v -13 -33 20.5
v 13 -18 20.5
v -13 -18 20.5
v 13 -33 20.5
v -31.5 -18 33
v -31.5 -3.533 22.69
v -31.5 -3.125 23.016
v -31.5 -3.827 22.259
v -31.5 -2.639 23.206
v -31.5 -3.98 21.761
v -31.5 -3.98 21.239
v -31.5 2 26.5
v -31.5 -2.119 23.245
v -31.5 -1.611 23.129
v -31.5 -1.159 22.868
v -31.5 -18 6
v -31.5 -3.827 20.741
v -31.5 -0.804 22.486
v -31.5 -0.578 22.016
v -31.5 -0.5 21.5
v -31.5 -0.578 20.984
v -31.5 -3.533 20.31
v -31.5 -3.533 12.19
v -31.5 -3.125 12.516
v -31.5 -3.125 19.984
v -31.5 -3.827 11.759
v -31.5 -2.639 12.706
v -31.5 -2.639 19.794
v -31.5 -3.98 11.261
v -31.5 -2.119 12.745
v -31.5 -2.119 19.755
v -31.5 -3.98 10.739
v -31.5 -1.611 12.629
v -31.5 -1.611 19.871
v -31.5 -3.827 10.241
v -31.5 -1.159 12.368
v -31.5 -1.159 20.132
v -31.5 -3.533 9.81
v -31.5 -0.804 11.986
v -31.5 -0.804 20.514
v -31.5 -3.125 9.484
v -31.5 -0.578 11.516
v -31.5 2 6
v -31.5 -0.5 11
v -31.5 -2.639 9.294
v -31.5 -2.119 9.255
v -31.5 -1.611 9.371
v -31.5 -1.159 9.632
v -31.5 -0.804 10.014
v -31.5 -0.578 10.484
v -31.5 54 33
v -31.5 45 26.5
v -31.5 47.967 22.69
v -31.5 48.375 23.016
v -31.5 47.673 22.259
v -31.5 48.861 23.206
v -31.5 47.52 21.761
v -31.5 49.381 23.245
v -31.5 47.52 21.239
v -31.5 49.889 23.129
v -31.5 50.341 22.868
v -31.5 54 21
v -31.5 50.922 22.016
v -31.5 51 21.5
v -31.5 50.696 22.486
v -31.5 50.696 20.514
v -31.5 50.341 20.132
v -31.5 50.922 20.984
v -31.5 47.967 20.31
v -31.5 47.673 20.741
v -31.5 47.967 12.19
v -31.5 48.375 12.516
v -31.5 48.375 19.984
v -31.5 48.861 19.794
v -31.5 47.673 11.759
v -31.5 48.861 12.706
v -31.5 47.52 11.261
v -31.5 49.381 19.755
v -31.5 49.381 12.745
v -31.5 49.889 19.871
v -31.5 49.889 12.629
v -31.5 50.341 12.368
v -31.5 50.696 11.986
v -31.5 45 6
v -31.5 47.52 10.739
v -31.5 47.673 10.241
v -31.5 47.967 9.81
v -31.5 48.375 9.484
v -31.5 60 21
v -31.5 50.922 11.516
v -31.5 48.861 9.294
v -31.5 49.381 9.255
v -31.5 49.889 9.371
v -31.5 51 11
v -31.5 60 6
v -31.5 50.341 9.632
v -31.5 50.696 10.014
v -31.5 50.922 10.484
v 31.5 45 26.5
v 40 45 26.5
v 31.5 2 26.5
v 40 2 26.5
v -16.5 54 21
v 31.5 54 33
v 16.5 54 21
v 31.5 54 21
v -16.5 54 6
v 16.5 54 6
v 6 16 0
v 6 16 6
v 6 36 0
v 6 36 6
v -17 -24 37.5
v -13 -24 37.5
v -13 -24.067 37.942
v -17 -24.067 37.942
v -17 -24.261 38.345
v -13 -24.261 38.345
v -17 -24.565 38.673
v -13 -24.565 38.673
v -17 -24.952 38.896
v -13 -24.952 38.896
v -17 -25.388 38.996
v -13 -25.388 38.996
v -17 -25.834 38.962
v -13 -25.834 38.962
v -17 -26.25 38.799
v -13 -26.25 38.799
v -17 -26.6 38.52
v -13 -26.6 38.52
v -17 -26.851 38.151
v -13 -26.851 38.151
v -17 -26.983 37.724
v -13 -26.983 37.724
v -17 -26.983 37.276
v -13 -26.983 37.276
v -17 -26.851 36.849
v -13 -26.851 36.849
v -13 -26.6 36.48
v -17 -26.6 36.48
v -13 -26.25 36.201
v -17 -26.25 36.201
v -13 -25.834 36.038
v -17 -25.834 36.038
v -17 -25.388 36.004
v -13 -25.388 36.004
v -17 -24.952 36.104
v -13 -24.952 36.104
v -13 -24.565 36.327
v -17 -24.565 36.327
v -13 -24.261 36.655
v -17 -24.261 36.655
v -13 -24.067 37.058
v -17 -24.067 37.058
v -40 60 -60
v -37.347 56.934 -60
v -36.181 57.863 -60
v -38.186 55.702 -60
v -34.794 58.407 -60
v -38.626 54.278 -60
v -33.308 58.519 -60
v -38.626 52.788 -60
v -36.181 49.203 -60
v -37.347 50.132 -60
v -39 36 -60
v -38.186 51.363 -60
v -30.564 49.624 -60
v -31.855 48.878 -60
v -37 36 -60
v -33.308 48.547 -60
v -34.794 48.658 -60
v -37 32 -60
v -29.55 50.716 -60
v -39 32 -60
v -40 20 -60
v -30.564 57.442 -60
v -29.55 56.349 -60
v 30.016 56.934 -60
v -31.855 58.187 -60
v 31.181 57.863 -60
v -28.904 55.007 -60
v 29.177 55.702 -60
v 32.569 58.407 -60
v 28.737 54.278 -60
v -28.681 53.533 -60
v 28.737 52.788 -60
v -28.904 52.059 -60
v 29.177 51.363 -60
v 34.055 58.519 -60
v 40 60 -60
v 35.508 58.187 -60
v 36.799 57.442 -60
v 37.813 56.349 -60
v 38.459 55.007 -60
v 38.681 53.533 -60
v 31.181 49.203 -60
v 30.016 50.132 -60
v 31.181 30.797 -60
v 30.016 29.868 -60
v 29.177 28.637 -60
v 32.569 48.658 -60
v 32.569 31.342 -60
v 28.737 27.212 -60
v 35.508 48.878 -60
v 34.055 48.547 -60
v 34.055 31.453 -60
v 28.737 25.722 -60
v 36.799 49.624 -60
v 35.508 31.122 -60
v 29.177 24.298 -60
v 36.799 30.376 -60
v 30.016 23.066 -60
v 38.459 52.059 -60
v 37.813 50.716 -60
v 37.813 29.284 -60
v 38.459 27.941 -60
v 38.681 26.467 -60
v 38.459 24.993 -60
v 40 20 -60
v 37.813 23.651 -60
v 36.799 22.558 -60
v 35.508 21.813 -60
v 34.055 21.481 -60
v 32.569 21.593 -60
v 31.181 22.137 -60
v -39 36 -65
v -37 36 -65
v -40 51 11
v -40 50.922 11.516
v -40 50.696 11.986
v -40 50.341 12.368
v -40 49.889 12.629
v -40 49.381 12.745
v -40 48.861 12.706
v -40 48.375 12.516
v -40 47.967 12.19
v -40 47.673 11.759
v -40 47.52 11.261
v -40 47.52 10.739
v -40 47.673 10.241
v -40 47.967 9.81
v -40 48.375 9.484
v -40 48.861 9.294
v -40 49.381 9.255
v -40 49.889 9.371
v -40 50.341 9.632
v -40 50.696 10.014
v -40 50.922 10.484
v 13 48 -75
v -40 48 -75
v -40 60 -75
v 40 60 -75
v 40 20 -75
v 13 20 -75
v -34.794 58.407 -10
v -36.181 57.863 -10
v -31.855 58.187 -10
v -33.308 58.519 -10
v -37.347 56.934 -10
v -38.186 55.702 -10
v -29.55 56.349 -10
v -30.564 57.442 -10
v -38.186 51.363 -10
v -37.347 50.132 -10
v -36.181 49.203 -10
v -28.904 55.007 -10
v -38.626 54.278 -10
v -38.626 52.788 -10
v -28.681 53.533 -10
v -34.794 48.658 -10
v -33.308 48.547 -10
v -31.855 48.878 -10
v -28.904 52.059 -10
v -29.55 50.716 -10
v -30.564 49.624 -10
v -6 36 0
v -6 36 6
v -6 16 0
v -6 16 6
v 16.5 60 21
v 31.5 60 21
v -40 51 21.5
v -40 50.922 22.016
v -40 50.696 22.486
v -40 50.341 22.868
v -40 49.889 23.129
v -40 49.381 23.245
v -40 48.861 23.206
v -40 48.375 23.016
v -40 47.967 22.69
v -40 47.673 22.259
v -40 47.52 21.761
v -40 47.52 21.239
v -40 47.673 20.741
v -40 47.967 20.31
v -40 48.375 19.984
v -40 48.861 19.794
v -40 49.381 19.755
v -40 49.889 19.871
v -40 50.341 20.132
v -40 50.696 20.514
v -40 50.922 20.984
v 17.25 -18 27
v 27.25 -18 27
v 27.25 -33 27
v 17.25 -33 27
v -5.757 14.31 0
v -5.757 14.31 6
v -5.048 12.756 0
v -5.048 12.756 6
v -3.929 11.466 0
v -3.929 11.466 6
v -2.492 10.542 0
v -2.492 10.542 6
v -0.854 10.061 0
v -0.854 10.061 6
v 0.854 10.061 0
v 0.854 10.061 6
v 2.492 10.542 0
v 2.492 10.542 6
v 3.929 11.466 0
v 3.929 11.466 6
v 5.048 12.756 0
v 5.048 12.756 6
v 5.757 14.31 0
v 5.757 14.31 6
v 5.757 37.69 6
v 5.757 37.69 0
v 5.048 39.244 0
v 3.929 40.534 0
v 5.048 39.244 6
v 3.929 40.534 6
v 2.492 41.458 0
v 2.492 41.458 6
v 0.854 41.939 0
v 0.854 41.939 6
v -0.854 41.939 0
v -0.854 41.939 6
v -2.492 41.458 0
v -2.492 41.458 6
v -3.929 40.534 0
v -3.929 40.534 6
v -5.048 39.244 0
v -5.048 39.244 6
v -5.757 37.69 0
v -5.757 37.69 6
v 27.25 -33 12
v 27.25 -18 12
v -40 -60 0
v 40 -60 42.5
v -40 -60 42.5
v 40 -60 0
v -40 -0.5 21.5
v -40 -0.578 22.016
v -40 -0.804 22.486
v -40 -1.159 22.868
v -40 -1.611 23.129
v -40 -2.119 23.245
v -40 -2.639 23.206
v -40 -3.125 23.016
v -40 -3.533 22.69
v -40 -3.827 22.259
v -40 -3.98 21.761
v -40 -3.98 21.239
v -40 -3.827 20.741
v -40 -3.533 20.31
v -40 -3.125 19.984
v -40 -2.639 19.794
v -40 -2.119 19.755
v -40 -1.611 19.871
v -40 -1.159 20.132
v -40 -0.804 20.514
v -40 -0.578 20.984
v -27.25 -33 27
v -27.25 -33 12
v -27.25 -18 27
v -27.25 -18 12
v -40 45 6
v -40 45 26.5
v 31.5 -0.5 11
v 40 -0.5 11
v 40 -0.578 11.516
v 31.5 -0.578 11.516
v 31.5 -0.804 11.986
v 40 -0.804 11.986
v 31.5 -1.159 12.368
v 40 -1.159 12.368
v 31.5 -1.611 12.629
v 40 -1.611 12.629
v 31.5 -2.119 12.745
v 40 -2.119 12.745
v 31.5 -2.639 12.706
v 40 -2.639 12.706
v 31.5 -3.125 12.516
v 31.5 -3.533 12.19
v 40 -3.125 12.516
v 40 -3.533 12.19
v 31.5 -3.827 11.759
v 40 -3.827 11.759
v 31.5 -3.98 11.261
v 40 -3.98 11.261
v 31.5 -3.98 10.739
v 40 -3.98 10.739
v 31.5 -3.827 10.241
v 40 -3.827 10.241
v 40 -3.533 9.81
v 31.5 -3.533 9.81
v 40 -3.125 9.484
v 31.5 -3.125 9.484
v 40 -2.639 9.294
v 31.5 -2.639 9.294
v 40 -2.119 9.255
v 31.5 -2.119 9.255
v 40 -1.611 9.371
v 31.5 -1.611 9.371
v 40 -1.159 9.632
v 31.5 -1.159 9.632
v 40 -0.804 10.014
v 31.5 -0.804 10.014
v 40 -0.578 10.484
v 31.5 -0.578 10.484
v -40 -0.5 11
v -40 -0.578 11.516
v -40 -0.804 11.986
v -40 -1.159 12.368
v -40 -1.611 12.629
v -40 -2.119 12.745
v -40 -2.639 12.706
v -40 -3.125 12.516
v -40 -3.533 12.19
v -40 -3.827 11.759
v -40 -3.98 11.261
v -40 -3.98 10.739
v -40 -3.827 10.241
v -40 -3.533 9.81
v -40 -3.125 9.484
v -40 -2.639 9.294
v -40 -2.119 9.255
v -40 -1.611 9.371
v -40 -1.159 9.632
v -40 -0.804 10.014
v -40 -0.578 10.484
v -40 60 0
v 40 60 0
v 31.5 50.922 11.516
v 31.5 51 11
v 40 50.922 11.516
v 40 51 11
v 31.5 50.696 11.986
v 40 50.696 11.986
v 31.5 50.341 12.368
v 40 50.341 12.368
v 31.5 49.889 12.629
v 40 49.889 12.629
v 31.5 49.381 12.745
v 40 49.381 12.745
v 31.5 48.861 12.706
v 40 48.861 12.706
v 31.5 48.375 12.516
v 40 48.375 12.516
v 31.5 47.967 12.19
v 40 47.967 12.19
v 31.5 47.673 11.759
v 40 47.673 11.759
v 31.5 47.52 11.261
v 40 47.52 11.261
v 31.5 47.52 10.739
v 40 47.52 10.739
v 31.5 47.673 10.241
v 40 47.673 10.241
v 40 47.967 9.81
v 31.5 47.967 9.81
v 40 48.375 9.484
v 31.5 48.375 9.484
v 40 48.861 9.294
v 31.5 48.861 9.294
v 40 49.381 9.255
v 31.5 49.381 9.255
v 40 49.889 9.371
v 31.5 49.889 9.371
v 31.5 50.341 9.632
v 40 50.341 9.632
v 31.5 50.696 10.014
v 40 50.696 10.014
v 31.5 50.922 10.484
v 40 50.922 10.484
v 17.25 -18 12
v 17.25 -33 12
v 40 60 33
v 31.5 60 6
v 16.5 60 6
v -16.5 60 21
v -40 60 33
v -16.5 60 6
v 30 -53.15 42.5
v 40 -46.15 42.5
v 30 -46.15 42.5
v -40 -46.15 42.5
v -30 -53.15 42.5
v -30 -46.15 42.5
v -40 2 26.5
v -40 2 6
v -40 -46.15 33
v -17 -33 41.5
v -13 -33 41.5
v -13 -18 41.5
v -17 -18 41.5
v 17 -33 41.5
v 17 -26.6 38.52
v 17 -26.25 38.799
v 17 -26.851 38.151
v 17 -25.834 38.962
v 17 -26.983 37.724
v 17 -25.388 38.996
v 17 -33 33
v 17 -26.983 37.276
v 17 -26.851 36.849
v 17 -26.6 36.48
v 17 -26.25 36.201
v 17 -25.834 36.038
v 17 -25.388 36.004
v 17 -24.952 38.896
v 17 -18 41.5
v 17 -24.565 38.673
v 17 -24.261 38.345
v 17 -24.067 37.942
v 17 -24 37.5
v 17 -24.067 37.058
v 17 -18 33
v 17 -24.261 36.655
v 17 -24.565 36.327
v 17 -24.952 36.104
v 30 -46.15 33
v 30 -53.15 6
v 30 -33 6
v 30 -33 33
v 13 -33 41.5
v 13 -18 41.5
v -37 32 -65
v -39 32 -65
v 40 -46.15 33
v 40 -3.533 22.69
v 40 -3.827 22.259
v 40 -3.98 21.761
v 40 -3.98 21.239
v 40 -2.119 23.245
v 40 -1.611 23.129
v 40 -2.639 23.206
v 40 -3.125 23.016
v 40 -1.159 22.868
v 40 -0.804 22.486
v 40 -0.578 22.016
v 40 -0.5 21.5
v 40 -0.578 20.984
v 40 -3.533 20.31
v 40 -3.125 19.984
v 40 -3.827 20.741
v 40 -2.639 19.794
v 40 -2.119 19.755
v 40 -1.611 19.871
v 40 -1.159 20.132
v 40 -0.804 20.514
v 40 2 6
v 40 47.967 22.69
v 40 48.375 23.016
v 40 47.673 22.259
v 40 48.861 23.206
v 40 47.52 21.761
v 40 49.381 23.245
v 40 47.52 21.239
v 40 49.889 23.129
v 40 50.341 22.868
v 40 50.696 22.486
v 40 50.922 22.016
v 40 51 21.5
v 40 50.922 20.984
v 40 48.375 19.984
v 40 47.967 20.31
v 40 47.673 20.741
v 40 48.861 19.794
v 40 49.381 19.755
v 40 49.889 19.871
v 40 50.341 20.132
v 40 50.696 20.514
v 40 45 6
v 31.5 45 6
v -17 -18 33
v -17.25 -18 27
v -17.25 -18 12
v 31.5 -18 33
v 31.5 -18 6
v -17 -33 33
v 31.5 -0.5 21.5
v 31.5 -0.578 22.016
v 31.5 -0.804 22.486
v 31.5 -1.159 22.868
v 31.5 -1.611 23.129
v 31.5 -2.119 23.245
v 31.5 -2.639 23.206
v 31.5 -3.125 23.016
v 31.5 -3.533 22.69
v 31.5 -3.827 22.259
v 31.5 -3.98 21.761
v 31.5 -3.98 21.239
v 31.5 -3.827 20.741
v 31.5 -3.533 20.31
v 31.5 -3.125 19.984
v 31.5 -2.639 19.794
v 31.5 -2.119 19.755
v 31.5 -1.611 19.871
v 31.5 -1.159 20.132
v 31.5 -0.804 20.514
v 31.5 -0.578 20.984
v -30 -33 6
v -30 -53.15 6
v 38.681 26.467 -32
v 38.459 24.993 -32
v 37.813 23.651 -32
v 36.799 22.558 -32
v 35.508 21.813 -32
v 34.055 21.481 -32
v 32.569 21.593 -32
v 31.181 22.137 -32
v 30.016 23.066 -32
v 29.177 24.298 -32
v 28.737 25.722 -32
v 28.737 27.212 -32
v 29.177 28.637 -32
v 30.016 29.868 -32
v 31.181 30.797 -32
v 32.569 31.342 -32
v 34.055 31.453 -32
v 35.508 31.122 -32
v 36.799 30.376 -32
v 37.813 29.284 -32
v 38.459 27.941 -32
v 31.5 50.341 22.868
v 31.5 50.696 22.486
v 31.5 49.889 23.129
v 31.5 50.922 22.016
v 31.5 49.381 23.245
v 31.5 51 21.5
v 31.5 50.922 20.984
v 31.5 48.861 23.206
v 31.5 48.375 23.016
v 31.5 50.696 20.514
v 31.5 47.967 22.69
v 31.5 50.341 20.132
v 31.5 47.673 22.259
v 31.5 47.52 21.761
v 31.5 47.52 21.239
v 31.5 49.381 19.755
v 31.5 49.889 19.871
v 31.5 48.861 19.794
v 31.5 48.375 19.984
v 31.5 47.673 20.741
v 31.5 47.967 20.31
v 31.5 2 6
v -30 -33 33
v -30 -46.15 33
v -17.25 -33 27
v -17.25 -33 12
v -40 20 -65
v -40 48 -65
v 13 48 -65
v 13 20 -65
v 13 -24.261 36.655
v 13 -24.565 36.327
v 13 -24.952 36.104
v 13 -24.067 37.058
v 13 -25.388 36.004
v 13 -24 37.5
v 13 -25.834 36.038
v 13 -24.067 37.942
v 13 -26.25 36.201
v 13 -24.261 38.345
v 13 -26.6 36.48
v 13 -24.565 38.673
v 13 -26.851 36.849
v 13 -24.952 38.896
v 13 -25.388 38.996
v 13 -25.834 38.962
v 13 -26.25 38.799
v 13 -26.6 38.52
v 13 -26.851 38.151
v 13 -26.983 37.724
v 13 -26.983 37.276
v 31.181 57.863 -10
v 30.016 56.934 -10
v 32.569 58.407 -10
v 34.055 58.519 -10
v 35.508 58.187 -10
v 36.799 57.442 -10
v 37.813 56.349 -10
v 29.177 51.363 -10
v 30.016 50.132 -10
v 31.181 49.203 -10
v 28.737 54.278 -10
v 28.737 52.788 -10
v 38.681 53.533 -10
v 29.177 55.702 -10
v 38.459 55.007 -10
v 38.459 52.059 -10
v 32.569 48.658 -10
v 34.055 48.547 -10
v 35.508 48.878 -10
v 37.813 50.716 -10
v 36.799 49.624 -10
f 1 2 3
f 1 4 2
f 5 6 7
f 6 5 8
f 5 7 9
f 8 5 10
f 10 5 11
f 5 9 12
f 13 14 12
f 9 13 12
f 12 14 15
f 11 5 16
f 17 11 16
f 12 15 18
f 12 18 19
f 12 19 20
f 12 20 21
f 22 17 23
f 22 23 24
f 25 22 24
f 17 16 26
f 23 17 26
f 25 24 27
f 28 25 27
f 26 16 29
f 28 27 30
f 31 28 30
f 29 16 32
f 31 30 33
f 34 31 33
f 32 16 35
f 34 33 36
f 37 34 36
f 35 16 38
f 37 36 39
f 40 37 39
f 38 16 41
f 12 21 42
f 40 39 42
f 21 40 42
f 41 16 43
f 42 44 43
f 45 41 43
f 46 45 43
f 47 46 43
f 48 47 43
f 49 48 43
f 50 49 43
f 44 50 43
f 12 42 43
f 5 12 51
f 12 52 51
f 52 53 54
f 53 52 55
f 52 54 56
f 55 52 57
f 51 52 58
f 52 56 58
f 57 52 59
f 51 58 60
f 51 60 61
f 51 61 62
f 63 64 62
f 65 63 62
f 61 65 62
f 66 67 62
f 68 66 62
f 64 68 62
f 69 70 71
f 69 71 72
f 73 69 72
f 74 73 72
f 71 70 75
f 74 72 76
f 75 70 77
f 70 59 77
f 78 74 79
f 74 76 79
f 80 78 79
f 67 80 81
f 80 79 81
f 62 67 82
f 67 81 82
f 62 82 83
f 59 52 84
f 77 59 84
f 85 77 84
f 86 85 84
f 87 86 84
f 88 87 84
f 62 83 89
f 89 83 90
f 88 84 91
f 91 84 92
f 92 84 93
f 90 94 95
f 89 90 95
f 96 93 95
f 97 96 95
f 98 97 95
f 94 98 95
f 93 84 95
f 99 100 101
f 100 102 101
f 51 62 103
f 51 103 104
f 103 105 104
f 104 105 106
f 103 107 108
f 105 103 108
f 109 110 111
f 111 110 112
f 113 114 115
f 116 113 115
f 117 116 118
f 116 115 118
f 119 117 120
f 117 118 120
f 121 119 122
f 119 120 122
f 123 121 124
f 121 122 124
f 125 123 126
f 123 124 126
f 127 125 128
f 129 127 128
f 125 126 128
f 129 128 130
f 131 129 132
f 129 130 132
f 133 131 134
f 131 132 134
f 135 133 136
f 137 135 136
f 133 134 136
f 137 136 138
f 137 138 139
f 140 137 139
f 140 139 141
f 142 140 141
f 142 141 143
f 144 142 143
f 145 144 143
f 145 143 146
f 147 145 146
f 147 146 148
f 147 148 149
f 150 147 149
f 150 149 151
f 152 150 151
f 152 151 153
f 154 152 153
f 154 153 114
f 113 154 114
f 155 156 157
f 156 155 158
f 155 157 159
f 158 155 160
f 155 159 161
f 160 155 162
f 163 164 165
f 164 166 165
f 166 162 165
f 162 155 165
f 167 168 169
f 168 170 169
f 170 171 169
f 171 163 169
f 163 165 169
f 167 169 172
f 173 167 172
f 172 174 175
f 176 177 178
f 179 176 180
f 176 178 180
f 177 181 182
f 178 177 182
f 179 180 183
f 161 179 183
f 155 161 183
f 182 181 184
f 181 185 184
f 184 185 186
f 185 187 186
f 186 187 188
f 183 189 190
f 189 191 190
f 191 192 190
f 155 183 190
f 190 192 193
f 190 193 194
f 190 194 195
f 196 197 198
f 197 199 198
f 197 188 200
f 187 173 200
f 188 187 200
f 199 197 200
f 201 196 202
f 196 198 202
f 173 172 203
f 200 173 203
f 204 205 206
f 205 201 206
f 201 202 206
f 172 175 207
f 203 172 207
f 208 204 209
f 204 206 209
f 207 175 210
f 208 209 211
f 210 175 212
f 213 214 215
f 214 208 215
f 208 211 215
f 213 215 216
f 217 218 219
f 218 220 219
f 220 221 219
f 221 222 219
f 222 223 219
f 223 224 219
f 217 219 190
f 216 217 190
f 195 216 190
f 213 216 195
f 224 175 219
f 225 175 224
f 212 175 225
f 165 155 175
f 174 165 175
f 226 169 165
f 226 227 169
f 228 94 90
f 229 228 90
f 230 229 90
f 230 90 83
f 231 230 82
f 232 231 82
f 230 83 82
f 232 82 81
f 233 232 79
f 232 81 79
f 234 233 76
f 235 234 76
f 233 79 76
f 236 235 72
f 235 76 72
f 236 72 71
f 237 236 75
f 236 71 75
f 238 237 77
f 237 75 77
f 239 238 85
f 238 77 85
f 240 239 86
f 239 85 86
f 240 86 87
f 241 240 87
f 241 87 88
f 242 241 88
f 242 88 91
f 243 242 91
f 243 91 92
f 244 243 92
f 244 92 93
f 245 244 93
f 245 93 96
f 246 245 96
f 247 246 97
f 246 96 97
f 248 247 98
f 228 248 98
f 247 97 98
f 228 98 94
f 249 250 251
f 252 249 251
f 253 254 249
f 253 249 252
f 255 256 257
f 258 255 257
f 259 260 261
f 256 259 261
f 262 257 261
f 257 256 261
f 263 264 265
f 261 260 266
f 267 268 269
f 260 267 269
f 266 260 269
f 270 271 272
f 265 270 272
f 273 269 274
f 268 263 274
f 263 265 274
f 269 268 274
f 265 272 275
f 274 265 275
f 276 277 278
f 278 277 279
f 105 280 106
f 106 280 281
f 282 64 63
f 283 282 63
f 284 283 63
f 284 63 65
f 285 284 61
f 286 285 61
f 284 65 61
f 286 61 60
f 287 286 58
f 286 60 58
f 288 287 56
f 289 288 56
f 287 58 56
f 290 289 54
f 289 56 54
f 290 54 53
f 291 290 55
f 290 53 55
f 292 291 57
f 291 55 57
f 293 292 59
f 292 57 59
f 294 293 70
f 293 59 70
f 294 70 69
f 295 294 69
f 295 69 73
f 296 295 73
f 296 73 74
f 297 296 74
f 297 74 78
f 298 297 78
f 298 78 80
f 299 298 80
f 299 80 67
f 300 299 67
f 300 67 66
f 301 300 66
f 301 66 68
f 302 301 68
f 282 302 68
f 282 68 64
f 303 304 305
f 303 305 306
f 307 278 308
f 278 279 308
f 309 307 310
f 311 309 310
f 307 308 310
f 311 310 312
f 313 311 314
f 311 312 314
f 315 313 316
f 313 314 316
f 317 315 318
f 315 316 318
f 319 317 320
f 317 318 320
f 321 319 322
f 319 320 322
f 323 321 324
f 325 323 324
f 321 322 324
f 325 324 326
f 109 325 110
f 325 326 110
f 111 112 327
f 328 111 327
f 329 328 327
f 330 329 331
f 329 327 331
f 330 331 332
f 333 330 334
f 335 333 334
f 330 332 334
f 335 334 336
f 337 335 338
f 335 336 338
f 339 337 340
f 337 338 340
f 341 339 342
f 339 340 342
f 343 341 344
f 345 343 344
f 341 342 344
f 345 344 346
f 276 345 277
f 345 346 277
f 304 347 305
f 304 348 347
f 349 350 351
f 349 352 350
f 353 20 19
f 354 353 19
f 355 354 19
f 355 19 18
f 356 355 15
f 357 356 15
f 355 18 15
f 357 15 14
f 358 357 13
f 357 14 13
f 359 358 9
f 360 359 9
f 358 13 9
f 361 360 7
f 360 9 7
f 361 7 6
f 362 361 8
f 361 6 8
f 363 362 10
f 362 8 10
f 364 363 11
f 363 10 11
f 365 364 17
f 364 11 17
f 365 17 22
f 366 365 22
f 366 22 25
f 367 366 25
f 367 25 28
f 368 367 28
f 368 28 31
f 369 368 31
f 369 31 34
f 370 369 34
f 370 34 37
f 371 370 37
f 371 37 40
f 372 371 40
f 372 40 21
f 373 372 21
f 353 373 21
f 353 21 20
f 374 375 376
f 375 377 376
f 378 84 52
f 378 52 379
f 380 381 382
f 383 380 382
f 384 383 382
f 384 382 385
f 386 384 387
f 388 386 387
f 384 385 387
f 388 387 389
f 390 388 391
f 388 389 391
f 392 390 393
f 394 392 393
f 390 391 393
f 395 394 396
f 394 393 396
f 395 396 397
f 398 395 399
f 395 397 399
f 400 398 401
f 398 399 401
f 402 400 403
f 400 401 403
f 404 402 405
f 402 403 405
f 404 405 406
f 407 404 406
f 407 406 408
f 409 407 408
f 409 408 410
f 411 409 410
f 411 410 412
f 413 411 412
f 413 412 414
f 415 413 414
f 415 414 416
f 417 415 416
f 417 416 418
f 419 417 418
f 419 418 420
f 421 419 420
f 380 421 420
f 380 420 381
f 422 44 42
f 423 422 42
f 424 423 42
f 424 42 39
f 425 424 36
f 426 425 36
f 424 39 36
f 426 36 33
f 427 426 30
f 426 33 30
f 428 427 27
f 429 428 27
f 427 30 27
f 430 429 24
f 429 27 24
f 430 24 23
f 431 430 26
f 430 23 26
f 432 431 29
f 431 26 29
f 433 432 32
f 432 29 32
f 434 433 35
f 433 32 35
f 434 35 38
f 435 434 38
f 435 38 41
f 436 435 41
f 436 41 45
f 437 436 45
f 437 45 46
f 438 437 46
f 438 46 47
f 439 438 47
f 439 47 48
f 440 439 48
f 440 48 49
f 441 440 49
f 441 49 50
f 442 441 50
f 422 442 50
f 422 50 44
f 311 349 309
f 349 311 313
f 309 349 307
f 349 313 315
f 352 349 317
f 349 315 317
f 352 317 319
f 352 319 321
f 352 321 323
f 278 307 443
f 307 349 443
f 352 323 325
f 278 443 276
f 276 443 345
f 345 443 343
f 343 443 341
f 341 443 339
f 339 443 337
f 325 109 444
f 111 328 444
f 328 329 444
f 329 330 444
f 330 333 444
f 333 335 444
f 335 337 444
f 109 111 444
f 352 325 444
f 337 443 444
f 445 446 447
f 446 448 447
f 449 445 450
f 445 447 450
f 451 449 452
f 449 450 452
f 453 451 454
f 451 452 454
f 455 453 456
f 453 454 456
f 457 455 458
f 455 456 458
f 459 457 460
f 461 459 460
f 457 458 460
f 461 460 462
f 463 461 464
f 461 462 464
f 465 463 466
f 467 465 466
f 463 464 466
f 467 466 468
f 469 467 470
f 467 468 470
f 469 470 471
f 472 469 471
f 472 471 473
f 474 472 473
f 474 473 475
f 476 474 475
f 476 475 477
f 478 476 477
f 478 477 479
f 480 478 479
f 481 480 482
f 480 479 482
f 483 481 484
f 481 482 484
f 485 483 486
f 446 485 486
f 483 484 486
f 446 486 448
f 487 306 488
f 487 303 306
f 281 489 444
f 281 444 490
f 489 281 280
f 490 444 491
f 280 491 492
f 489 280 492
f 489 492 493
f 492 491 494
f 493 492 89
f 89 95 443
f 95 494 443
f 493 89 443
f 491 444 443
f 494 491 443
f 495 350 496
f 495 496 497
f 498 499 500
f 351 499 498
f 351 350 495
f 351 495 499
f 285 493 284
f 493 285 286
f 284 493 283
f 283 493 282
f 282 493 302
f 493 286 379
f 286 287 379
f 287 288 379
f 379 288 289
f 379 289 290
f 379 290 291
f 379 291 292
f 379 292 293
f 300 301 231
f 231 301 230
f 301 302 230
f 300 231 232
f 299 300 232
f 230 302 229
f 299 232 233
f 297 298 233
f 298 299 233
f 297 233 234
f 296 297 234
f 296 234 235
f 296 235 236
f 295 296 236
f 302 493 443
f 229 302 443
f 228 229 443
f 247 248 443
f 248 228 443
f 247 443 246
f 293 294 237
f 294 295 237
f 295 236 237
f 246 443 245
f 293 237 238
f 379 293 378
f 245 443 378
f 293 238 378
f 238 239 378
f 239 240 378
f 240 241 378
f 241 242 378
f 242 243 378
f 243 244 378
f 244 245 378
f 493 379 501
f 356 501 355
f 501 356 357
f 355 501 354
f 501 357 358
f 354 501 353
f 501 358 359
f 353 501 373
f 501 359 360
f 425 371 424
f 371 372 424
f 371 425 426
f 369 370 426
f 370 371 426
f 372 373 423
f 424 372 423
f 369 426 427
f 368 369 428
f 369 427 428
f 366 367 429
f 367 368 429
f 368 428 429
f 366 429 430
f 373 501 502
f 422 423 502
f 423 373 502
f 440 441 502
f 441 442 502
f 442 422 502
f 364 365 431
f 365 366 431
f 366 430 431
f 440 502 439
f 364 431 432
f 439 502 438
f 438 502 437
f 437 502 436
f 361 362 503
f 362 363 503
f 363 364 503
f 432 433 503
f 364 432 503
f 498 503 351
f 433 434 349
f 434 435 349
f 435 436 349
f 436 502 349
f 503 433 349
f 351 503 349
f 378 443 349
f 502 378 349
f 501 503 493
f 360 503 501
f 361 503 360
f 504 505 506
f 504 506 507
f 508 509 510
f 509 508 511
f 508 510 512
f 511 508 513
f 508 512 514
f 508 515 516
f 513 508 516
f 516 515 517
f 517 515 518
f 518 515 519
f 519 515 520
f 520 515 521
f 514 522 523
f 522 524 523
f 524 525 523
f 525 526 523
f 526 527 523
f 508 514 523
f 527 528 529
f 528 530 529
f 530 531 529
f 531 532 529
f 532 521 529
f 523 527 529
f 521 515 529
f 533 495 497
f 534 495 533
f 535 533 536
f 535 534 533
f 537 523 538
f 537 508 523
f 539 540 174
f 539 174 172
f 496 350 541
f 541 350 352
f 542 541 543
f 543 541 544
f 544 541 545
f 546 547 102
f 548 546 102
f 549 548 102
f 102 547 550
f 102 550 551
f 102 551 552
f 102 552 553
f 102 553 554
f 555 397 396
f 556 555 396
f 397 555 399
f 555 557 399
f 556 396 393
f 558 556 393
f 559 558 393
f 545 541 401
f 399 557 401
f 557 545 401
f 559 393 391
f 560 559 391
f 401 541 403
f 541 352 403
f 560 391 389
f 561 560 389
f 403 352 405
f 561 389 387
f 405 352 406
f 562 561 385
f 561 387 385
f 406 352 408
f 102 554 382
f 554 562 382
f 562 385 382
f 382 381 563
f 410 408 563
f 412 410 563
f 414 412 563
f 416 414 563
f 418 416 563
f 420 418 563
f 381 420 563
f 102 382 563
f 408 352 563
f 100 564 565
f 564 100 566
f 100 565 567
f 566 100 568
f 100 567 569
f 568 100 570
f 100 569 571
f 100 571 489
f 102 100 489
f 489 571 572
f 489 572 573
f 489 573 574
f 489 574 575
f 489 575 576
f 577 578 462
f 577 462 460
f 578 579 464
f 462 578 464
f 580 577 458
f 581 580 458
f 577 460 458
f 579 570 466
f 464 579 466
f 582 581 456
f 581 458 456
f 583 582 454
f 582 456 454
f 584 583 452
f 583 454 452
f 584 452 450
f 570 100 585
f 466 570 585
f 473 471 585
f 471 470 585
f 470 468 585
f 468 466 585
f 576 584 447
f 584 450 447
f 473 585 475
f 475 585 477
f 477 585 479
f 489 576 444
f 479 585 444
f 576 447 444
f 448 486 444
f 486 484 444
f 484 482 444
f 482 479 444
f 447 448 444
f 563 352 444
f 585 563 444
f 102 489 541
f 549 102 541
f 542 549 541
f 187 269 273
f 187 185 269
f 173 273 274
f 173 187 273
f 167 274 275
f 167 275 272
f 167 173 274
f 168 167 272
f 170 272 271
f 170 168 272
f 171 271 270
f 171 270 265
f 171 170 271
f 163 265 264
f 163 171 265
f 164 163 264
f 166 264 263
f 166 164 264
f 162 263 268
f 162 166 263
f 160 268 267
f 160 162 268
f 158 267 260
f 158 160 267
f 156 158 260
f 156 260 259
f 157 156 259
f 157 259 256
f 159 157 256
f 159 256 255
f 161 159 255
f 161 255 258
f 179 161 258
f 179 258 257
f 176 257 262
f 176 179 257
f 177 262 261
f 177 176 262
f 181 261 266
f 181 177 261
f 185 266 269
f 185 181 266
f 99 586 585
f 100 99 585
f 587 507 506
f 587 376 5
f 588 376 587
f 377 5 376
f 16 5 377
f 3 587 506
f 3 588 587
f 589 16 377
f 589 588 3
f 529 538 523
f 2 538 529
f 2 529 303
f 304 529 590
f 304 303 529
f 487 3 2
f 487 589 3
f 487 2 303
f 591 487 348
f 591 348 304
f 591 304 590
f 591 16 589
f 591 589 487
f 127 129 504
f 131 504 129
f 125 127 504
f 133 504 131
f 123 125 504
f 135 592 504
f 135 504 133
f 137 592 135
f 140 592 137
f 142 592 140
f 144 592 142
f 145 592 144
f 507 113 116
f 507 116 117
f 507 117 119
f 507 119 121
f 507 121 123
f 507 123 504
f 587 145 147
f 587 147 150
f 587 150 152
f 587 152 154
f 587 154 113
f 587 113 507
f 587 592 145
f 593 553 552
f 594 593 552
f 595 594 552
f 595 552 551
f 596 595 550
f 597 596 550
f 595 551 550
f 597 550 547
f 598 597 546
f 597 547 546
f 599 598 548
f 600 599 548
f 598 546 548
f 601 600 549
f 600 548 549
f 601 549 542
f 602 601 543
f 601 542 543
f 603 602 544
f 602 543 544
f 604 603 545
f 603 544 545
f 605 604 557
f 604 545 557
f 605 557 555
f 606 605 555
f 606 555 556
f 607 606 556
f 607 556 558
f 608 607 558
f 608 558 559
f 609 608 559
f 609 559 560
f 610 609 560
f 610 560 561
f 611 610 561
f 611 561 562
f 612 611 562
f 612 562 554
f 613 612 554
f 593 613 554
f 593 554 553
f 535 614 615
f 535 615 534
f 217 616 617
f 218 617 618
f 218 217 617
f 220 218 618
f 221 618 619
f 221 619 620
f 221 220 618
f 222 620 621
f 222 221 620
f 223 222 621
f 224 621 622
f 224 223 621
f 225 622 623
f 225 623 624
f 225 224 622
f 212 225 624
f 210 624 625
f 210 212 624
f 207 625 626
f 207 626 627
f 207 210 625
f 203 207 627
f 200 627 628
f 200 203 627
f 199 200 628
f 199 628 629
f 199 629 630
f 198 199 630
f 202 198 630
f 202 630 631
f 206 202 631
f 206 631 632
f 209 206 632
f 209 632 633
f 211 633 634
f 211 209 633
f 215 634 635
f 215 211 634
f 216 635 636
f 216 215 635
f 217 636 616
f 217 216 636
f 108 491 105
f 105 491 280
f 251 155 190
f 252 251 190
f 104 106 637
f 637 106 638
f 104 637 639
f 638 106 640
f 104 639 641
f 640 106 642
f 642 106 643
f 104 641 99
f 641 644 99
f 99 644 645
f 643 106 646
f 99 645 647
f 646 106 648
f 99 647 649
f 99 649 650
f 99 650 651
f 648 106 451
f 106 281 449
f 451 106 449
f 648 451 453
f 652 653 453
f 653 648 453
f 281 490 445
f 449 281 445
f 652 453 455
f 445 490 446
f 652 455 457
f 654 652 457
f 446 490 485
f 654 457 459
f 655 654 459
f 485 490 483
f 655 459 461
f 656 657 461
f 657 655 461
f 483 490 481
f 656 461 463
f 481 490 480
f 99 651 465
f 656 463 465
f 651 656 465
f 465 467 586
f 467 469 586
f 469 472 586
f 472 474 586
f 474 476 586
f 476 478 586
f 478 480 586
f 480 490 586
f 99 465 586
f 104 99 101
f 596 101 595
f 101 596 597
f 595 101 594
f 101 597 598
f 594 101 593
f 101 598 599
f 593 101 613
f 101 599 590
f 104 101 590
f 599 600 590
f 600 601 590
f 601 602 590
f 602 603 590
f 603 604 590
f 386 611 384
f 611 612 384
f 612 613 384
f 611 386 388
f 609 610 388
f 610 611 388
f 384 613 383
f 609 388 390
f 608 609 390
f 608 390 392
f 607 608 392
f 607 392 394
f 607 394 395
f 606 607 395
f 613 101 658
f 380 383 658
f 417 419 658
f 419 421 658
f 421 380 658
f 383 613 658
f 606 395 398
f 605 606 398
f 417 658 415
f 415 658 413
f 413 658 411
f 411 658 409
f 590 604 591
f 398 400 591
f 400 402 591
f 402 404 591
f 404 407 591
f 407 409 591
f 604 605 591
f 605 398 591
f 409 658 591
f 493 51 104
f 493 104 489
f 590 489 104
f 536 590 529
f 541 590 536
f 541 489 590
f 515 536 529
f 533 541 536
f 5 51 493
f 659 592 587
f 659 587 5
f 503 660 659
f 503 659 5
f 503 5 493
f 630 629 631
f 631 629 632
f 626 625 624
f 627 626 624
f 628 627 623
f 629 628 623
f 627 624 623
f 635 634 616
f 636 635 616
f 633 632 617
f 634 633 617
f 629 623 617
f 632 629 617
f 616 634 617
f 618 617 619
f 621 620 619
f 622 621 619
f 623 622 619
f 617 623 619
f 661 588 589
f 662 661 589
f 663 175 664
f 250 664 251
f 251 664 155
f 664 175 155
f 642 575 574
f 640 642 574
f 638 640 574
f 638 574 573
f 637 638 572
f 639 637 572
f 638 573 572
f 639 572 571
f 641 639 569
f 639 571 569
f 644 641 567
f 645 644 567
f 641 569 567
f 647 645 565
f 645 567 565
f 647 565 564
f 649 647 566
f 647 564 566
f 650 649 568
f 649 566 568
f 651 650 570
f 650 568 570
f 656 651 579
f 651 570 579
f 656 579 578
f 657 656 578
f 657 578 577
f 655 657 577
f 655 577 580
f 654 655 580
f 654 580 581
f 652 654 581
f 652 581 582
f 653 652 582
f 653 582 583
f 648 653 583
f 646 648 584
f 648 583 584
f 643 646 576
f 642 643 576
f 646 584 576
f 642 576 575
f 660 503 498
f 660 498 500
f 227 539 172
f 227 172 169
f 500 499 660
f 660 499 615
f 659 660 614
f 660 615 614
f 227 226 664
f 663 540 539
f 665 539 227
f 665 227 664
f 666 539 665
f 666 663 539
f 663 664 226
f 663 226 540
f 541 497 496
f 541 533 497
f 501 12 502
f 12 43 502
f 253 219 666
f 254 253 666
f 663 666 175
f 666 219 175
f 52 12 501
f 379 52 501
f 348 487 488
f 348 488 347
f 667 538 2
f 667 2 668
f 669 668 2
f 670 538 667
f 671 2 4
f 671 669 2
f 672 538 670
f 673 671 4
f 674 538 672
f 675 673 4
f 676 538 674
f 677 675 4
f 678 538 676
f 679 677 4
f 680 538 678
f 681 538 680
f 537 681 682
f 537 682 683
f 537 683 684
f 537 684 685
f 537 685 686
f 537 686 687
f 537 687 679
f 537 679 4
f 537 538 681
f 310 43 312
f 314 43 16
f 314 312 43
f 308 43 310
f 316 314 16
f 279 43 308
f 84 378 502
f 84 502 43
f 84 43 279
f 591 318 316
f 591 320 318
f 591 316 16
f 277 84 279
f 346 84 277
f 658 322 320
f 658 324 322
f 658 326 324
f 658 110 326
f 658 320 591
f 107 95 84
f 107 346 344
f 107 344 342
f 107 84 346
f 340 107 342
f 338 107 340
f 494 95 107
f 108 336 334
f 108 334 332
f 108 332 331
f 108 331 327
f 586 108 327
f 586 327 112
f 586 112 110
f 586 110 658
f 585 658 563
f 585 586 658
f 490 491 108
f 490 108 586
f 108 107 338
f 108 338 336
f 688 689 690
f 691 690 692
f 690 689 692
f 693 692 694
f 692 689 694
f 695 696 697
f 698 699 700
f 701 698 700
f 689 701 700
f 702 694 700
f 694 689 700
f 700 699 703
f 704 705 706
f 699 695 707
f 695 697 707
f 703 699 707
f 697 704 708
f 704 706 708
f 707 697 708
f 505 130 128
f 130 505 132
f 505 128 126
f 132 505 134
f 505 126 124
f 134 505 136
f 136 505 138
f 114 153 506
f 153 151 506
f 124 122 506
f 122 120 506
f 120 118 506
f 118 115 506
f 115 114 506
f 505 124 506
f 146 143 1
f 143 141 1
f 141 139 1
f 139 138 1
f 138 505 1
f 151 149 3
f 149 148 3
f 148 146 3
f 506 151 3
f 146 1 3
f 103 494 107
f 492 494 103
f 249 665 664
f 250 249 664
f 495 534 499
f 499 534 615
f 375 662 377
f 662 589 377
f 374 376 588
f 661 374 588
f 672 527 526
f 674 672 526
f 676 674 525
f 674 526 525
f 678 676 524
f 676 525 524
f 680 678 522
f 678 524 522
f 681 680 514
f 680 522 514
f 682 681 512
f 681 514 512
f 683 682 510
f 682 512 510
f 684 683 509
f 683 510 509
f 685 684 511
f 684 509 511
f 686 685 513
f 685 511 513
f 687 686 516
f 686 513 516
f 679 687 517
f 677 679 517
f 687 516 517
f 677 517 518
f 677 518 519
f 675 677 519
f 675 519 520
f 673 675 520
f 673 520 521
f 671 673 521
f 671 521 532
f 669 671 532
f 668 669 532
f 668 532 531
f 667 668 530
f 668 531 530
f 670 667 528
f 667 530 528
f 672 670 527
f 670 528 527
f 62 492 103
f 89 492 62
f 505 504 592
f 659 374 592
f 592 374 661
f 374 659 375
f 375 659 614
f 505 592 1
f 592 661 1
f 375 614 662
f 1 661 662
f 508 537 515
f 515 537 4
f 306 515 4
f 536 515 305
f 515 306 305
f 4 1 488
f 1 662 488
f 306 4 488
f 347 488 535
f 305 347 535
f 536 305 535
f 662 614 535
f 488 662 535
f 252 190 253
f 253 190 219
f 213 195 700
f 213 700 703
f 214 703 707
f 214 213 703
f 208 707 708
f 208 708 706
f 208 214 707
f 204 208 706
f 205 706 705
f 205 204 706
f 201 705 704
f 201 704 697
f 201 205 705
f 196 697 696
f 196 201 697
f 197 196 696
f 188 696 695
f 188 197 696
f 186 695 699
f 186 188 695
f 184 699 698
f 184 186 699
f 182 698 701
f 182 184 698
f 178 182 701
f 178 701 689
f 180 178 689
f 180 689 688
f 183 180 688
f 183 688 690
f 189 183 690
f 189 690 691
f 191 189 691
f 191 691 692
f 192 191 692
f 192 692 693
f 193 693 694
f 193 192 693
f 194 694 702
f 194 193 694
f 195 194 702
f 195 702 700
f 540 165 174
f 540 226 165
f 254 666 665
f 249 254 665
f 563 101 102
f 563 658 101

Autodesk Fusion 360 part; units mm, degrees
sketch "Sketch1" plane through (0, 0, 0) normal (0, 0, 1) x (1, 0, 0)
  line L0 (40, -60) -> (-40, -60)
  line L1 (-40, -60) -> (-40, 60)
  line L2 (-40, 60) -> (40, 60)
  line L3 (40, 60) -> (40, -60)
  line L4 (40, -60) -> (-40, 60) construction
  line L5 (-40, -60) -> (40, 60) construction
  dimension "d1" = 80
  dimension "d2" = 120
extrude "Extrude1" add sketch "Sketch1" along normal blind 6 makes body 1
sketch "Sketch2" plane through (0, 0, 6) normal (0, 0, 1) x (-1, 0, 0)
  line L0 (-40, -60) -> (40, -60)
  line L1 (40, -60) -> (40, 60)
  line L2 (40, 60) -> (-40, 60)
  line L3 (-40, 60) -> (-40, -60)
  line L4 (40, 60) -> (-40, 60)
  line L5 (-40, 60) -> (-40, 53.15)
  line L6 (-40, 53.15) -> (40, 53.15)
  line L7 (40, 53.15) -> (40, 60)
  dimension "d5" = 6.85
extrude "Extrude2" add sketch "Sketch2" along normal blind 36.5 contours L1 L2 L3 L4 L5 L6 L7 bodies 1
sketch "Sketch3" plane through (0, 0, 6) normal (0, 0, 1) x (-1, 0, 0)
  line L0 (40, 53.15) -> (-40, 53.15)
  line L1 (-40, 53.15) -> (-40, -60)
  line L2 (-40, -60) -> (40, -60)
  line L3 (40, -60) -> (40, 53.15)
  line L4 (40, -60) -> (31.5, -60)
  line L5 (31.5, -60) -> (31.5, -45)
  line L6 (31.5, -45) -> (40, -45)
  line L7 (40, -45) -> (40, -60)
  line L8 (40, -45) -> (31.5, -45)
  line L9 (31.5, -45) -> (31.5, -2)
  line L10 (31.5, -2) -> (40, -2)
  line L11 (40, -2) -> (40, -45)
  line L12 (40, -2) -> (31.5, -2)
  line L13 (31.5, -2) -> (31.5, 18)
  line L14 (31.5, 18) -> (40, 18)
  line L15 (40, 18) -> (40, -2)
  line L16 (0, -60) -> (0, -52.5)
  line L17 (-31.5, -60) -> (-31.5, -45)
  line L18 (-31.5, -45) -> (-40, -45)
  line L19 (-31.5, -2) -> (-40, -2)
  line L20 (-31.5, -2) -> (-31.5, 18)
  line L21 (-31.5, 18) -> (-40, 18)
  line L22 (-40, 18) -> (-40, -2)
  line L23 (-40, -45) -> (-40, -60)
  line L24 (-40, -60) -> (-31.5, -60)
  line L25 (31.5, -60) -> (-31.5, -60)
  line L26 (-31.5, -60) -> (-31.5, -54)
  line L27 (-31.5, -54) -> (31.5, -54)
  line L28 (31.5, -54) -> (31.5, -60)
  line L29 (-31.5, -45) -> (-31.5, -2)
  line L30 (-40, -2) -> (-40, -45)
  dimension "d8" = 8.5
  dimension "d9" = 15
  dimension "d10" = 8.5
  dimension "d11" = 43
  dimension "d12" = 8.5
  dimension "d13" = 20
  dimension "d14" = 63
  dimension "d15" = 6
extrude "Extrude3" add sketch "Sketch3" along normal blind 20.5 contours L3 L10 L12 L13 L14 L15 | L1 L19 L20 L21 L22 | L2 L3 L4 L5 L6 L7 L8 L28 | L1 L2 L17 L18 L23 L24 L26 | L2 L5 L16 L25 L27 L28 | L2 L16 L17 L25 L26 L27 bodies 1
sketch "Sketch4" plane through (0, 60, 0) normal (0, 1, 0) x (-1, 0, 0)
  line L0 (-40, 0) -> (40, 0)
  line L1 (40, 0) -> (40, 26.5)
  line L2 (40, 26.5) -> (-40, 26.5)
  line L3 (-40, 26.5) -> (-40, 0)
  line L4 (-40, 0) -> (-31.5, 0)
  line L5 (-31.5, 0) -> (-31.5, 6)
  line L6 (-31.5, 6) -> (-40, 6)
  line L7 (-40, 6) -> (-40, 0)
  line L8 (-31.5, 6) -> (-11.5, 6)
  line L9 (-11.5, 6) -> (-11.5, 26)
  line L10 (-11.5, 26) -> (-31.5, 26)
  line L11 (-31.5, 26) -> (-31.5, 6)
  line L12 (0, 0) -> (0, 5)
  line L13 (11.5, 6) -> (11.5, 26)
  line L14 (11.5, 26) -> (31.5, 26)
  line L15 (31.5, 26) -> (31.5, 6)
  line L16 (31.5, 6) -> (11.5, 6)
  dimension "d18" = 8.5
  dimension "d19" = 6
  dimension "d20" = 20
  dimension "d21" = 20
extrude "Extrude4" cut sketch "Sketch4" against normal blind 15 contours L8 L9 L10 L11 | L13 L14 L15 L16 bodies 1
extrude "Extrude5" add sketch "Sketch3" along normal blind 6 from surface at 20.5 contours L3 L10 L12 L13 L14 L15 | L1 L19 L20 L21 L22 | L3 L6 L8 L9 L10 L11 L12 | L1 L18 L19 L29 L30 | L2 L3 L4 L5 L6 L7 L8 L28 | L1 L2 L17 L18 L23 L24 L26 | L2 L5 L16 L25 L27 L28 | L2 L16 L17 L25 L26 L27 bodies 1
extrude "Extrude6" add 1 faces at (-11.5, 56, 12.6667) along direction (-1, 0, 0) blind 5 on bodies 1 bodies 1
extrude "Extrude7" add 1 faces at (11.5, 56, 12.6667) along direction (1, 0, 0) blind 5 on bodies 1 bodies 1
extrude "Extrude8" add 1 faces at (26.5, 56, 26) along direction (0, 0, -1) blind 5 on bodies 1 bodies 1
extrude "Extrude9" add 1 faces at (-21.5, 58, 26) along direction (0, 0, -1) blind 5 on bodies 1 bodies 1
sketch "Sketch5" plane through (0, 0, 6) normal (0, 0, 1) x (-1, 0, 0)
  line L0 (-16.5, -60) -> (-16.5, -54)
  line L1 (-16.5, -54) -> (16.5, -54)
  line L2 (16.5, -54) -> (16.5, -60)
  line L3 (16.5, -60) -> (31.5, -60)
  line L4 (31.5, -60) -> (31.5, -45)
  line L5 (31.5, -45) -> (40, -45)
  line L6 (40, -45) -> (40, -2)
  line L7 (40, -2) -> (31.5, -2)
  line L8 (31.5, -2) -> (31.5, 18)
  line L9 (31.5, 18) -> (40, 18)
  line L10 (40, 18) -> (40, 53.15)
  line L11 (40, 53.15) -> (-40, 53.15)
  line L12 (-40, 53.15) -> (-40, 18)
  line L13 (-40, 18) -> (-31.5, 18)
  line L14 (-31.5, 18) -> (-31.5, -2)
  line L15 (-31.5, -2) -> (-40, -2)
  line L16 (-40, -2) -> (-40, -45)
  line L17 (-40, -45) -> (-31.5, -45)
  line L18 (-31.5, -45) -> (-31.5, -60)
  line L19 (-31.5, -60) -> (-16.5, -60)
  line L20 (-40, 18) -> (40, 18)
  line L21 (40, 18) -> (40, 33)
  line L22 (40, 33) -> (-40, 33)
  line L23 (-40, 33) -> (-40, 18)
  line L24 (-40, 53.15) -> (-30, 53.15)
  line L25 (-30, 53.15) -> (-30, 33)
  line L26 (-30, 33) -> (-40, 33)
  line L27 (-40, 33) -> (-40, 53.15)
  line L28 (40, 53.15) -> (30, 53.15)
  line L29 (30, 53.15) -> (30, 33)
  line L30 (30, 33) -> (40, 33)
  line L31 (40, 33) -> (40, 53.15)
  dimension "d35" = 15
  dimension "d36" = 10
  dimension "d37" = 10
extrude "Extrude10" add sketch "Sketch5" along normal blind 26.5 contours L9 L10 L12 L13 L20 L21 L22 L23 L26 L30 | L11 L12 L22 L24 L25 L26 L27 | L10 L11 L22 L28 L29 L30 L31 bodies 1
sketch "Sketch6" plane through (0, 0, 32.5) normal (0, 0, 1) x (-1, 0, 0)
  line L0 (31.5, 18) -> (31.5, -54)
  line L1 (31.5, -54) -> (-31.5, -54)
  line L2 (-31.5, -54) -> (-31.5, 18)
  line L3 (-31.5, 18) -> (31.5, 18)
  line L4 (40, -60) -> (40, 53.15)
  line L5 (40, 53.15) -> (30, 53.15)
  line L6 (30, 53.15) -> (30, 33)
  line L7 (30, 33) -> (-30, 33)
  line L8 (-30, 33) -> (-30, 53.15)
  line L9 (-30, 53.15) -> (-40, 53.15)
  line L10 (-40, 53.15) -> (-40, -60)
  line L11 (-40, -60) -> (40, -60)
  line L12 (-40, 53.15) -> (-30, 53.15)
  line L13 (-30, 53.15) -> (-30, 46.15)
  line L14 (-30, 46.15) -> (-40, 46.15)
  line L15 (-40, 46.15) -> (-40, 53.15)
  line L16 (30, 53.15) -> (40, 53.15)
  line L17 (40, 53.15) -> (40, 46.15)
  line L18 (40, 46.15) -> (30, 46.15)
  line L19 (30, 46.15) -> (30, 53.15)
  dimension "d40" = 7
  dimension "d41" = 7
extrude "Extrude11" add sketch "Sketch6" along normal blind 10 contours L4 L5 L6 L16 L17 L18 L19 | L8 L9 L10 L12 L13 L14 L15 bodies 1
sketch "Sketch7" plane through (0, 0, 32.5) normal (0, 0, 1) x (-1, 0, 0)
  line L0 (31.5, 18) -> (31.5, -54)
  line L1 (31.5, -54) -> (-31.5, -54)
  line L2 (-31.5, -54) -> (-31.5, 18)
  line L3 (-31.5, 18) -> (31.5, 18)
  line L4 (-30, 46.15) -> (-40, 46.15)
  line L5 (-40, 46.15) -> (-40, -60)
  line L6 (-40, -60) -> (40, -60)
  line L7 (40, -60) -> (40, 46.15)
  line L8 (40, 46.15) -> (30, 46.15)
  line L9 (30, 46.15) -> (30, 33)
  line L10 (30, 33) -> (-30, 33)
  line L11 (-30, 33) -> (-30, 46.15)
  line L12 (0, 18) -> (0, 33)
  line L13 (13, 18) -> (-13, 18)
  line L14 (-13, 18) -> (-13, 33)
  line L15 (-13, 33) -> (13, 33)
  line L16 (13, 33) -> (13, 18)
  line L17 (13, 18) -> (-13, 33) construction
  line L18 (-13, 18) -> (13, 33) construction
  line L19 (-13, 33) -> (-17, 33)
  line L20 (-17, 33) -> (-17, 18)
  line L21 (-17, 18) -> (-13, 18)
  line L22 (-13, 18) -> (-13, 33)
  line L23 (13, 33) -> (17, 33)
  line L24 (17, 33) -> (17, 18)
  line L25 (17, 18) -> (13, 18)
  line L26 (13, 18) -> (13, 33)
  point P0 (0, 25.5)
  dimension "d44" = 26
  dimension "d45" = 4
  dimension "d46" = 4
extrude "Extrude12" add sketch "Sketch7" along normal blind 9 contours L3 L10 L16 L23 L24 L25 L26 | L3 L10 L14 L19 L20 L21 L22 bodies 1
extrude "Extrude13" cut 1 faces at (-4.3333, -23, 32.5) along direction (0, 0, -1) blind 12 on bodies 1 bodies 1
sketch "Sketch8" plane through (17, 0, 0) normal (1, 0, 0) x (0, 1, 0)
  line L0 (-33, 32.5) -> (-18, 32.5)
  line L1 (-18, 32.5) -> (-18, 41.5)
  line L2 (-18, 41.5) -> (-33, 41.5)
  line L3 (-33, 41.5) -> (-33, 32.5)
  line L4 (-25.5, 41.5) -> (-25.5, 37.5)
  circle A0 centre (-25.5, 37.5) radius 1.5
  dimension "d51" = 4
  dimension "d52" = 3
extrude "Extrude14" cut sketch "Sketch8" against normal blind 40 contours A0 bodies 1
sketch "Sketch9" plane through (40, 0, 0) normal (1, 0, 0) x (0, 1, 0)
  line L0 (45, 26.5) -> (45, 6)
  line L1 (45, 6) -> (2, 6)
  line L2 (2, 6) -> (2, 26.5)
  line L3 (2, 26.5) -> (45, 26.5)
  line L4 (60, 0) -> (60, 32.5)
  line L5 (60, 32.5) -> (-46.15, 32.5)
  line L6 (-46.15, 32.5) -> (-46.15, 42.5)
  line L7 (-46.15, 42.5) -> (-60, 42.5)
  line L8 (-60, 42.5) -> (-60, 0)
  line L9 (-60, 0) -> (60, 0)
  line L10 (45, 6) -> (45, 11)
  line L11 (45, 11) -> (49.25, 11)
  circle A0 centre (49.25, 11) radius 1.75
  line L12 (45, 16.25) -> (47.125, 16.25)
  line L13 (23.5, 6) -> (23.5, 10)
  circle A1 centre (49.25, 21.5) radius 1.75
  circle A2 centre (-2.25, 11) radius 1.75
  circle A3 centre (-2.25, 21.5) radius 1.75
  dimension "d55" = 5
  dimension "d56" = 4.25
  dimension "d57" = 3.5
extrude "Extrude15" cut sketch "Sketch9" against normal blind 95 contours A0 | A1 | A2 | A3 bodies 1
sketch "Sketch10" plane through (0, 0, 6) normal (0, 0, 1) x (-1, 0, 0)
  line L0 (31.5, 18) -> (-31.5, 18)
  line L1 (-31.5, 18) -> (-31.5, -2)
  line L2 (-31.5, -2) -> (-40, -2)
  line L3 (-40, -2) -> (-40, -45)
  line L4 (-40, -45) -> (-31.5, -45)
  line L5 (-31.5, -45) -> (-31.5, -60)
  line L6 (-31.5, -60) -> (-16.5, -60)
  line L7 (-16.5, -60) -> (-16.5, -54)
  line L8 (-16.5, -54) -> (16.5, -54)
  line L9 (16.5, -54) -> (16.5, -60)
  line L10 (16.5, -60) -> (31.5, -60)
  line L11 (31.5, -60) -> (31.5, -45)
  line L12 (31.5, -45) -> (40, -45)
  line L13 (40, -45) -> (40, -2)
  line L14 (40, -2) -> (31.5, -2)
  line L15 (31.5, -2) -> (31.5, 18)
  line L16 (0, -60) -> (0, -26)
  line L17 (6, -36) -> (6, -16)
  arc A0 (6, -16) -> (-6, -16) centre (0, -16) ccw
  line L18 (-6, -16) -> (-6, -36)
  arc A1 (-6, -36) -> (6, -36) centre (0, -36) ccw
  line L19 (0, -36) -> (0, -16) construction
  point P0 (0, -26)
  dimension "d60" = 34
  dimension "d61" = 10
  dimension "d62" = 12
extrude "Extrude16" cut sketch "Sketch10" against normal blind 20 contours L17 A0 L18 A1 bodies 1
extrude "Extrude17" add 1 faces at (-26.1667, -23, 32.5) along direction (0, 0, 1) blind 0.5 on bodies 1 bodies 1
sketch "Sketch11" plane through (0, -18, 0) normal (0, 1, 0) x (-1, 0, 0)
  line L0 (13, 41.5) -> (13, 20.5)
  line L1 (13, 20.5) -> (-13, 20.5)
  line L2 (-13, 20.5) -> (-13, 41.5)
  line L3 (-13, 41.5) -> (-17, 41.5)
  line L4 (-17, 41.5) -> (-17, 33)
  line L5 (-17, 33) -> (-31.5, 33)
  line L6 (-31.5, 33) -> (-31.5, 6)
  line L7 (-31.5, 6) -> (31.5, 6)
  line L8 (31.5, 6) -> (31.5, 33)
  line L9 (31.5, 33) -> (17, 33)
  line L10 (17, 33) -> (17, 41.5)
  line L11 (17, 41.5) -> (13, 41.5)
  line L12 (-31.5, 19.5) -> (-13, 19.5)
  line L13 (-17.25, 12) -> (-27.25, 12)
  line L14 (-27.25, 12) -> (-27.25, 27)
  line L15 (-27.25, 27) -> (-17.25, 27)
  line L16 (-17.25, 27) -> (-17.25, 12)
  line L17 (-17.25, 12) -> (-27.25, 27) construction
  line L18 (-27.25, 12) -> (-17.25, 27) construction
  line L19 (0, 20.5) -> (0, 15)
  line L20 (27.25, 12) -> (27.25, 27)
  line L21 (27.25, 27) -> (17.25, 27)
  line L22 (17.25, 27) -> (17.25, 12)
  line L23 (17.25, 12) -> (27.25, 12)
  point P0 (-22.25, 19.5)
  dimension "d67" = 10
  dimension "d68" = 15
extrude "Extrude18" cut sketch "Sketch11" against normal blind 19 contours L12 L14 L15 L16 | L12 L13 L14 L16 | L20 L21 L22 L23 bodies 1
sketch "Sketch12" plane through (0, 0, 0) normal (0, 0, -1) x (1, 0, 0)
  line L0 (-6, -36) -> (-6, -16)
  arc A0 (6, -16) -> (-6, -16) centre (0, -16) ccw
  line L1 (6, -16) -> (6, -36)
  arc A1 (-6, -36) -> (6, -36) centre (0, -36) ccw
  line L2 (-40, -60) -> (40, -60)
  line L3 (40, -60) -> (40, 60)
  line L4 (40, 60) -> (-40, 60)
  line L5 (-40, 60) -> (-40, -60)
  line L6 (-40, -60) -> (40, -60)
  line L7 (40, -60) -> (40, -20)
  line L8 (40, -20) -> (-40, -20)
  line L9 (-40, -20) -> (-40, -60)
extrude "Extrude19" add sketch "Sketch12" along normal blind 5 from surface at 60 separate body contours L0 L1 A1 L2 L3 L5 L6 L7 L8 L9 | L0 L1 A1 L8 makes body 2
sketch "Sketch13" plane through (0, 0, -65) normal (0, 0, -1) x (1, 0, 0)
  line L0 (-40, -20) -> (-40, -60)
  line L1 (-40, -60) -> (40, -60)
  line L2 (40, -60) -> (40, -20)
  line L3 (40, -20) -> (-40, -20)
  circle A0 centre (-33.6814, -53.5328) radius 5
  circle A1 centre (33.6814, -53.5328) radius 5
  line L4 (-40, -40) -> (40, -40)
  circle A2 centre (33.6814, -26.4672) radius 5
  circle A3 centre (-33.6814, -26.4672) radius 5
  dimension "d74" = 10
extrude "Extrude20" add sketch "Sketch13" against normal blind 50 from surface at -5 contours A0 | A1 bodies 2
extrude "Extrude21" add sketch "Sketch13" against normal blind 28 from surface at -5 contours A2 bodies 2
sketch "Sketch14" plane through (0, 0, -65) normal (0, 0, -1) x (1, 0, 0)
  line L0 (-40, -20) -> (-40, -60)
  line L1 (-40, -60) -> (40, -60)
  line L2 (40, -60) -> (40, -20)
  line L3 (40, -20) -> (-40, -20)
  line L4 (40, -60) -> (-40, -60)
  line L5 (40, -20) -> (13, -20)
  line L6 (13, -20) -> (13, -48)
  line L7 (13, -48) -> (-40, -48)
  dimension "d81" = 27
  dimension "d82" = 28
extrude "Extrude22" add sketch "Sketch14" along normal blind 10 contours L0 L1 L2 L3 L4 L5 L6 L7 bodies 2
sketch "Sketch15" plane through (0, 0, -65) normal (0, 0, -1) x (1, 0, 0)
  line L0 (13, -48) -> (13, -20)
  line L1 (13, -20) -> (-40, -20)
  line L2 (-40, -20) -> (-40, -48)
  line L3 (-40, -48) -> (13, -48)
  line L4 (-40, -34) -> (13, -34) construction
  line L5 (-40, -34) -> (-40, -32) construction
  line L6 (-40, -34) -> (-40, -36) construction
  line L7 (-40, -32) -> (-39, -32) construction
  line L8 (-39, -32) -> (-37, -32)
  line L9 (-37, -32) -> (-37, -36)
  line L10 (-37, -36) -> (-39, -36)
  line L11 (-39, -36) -> (-39, -32)
  dimension "d85" = 2
  dimension "d86" = 2
  dimension "d87" = 2
extrude "Extrude23" cut sketch "Sketch15" against normal blind 19 contours L8 L9 L10 L11 bodies 2
